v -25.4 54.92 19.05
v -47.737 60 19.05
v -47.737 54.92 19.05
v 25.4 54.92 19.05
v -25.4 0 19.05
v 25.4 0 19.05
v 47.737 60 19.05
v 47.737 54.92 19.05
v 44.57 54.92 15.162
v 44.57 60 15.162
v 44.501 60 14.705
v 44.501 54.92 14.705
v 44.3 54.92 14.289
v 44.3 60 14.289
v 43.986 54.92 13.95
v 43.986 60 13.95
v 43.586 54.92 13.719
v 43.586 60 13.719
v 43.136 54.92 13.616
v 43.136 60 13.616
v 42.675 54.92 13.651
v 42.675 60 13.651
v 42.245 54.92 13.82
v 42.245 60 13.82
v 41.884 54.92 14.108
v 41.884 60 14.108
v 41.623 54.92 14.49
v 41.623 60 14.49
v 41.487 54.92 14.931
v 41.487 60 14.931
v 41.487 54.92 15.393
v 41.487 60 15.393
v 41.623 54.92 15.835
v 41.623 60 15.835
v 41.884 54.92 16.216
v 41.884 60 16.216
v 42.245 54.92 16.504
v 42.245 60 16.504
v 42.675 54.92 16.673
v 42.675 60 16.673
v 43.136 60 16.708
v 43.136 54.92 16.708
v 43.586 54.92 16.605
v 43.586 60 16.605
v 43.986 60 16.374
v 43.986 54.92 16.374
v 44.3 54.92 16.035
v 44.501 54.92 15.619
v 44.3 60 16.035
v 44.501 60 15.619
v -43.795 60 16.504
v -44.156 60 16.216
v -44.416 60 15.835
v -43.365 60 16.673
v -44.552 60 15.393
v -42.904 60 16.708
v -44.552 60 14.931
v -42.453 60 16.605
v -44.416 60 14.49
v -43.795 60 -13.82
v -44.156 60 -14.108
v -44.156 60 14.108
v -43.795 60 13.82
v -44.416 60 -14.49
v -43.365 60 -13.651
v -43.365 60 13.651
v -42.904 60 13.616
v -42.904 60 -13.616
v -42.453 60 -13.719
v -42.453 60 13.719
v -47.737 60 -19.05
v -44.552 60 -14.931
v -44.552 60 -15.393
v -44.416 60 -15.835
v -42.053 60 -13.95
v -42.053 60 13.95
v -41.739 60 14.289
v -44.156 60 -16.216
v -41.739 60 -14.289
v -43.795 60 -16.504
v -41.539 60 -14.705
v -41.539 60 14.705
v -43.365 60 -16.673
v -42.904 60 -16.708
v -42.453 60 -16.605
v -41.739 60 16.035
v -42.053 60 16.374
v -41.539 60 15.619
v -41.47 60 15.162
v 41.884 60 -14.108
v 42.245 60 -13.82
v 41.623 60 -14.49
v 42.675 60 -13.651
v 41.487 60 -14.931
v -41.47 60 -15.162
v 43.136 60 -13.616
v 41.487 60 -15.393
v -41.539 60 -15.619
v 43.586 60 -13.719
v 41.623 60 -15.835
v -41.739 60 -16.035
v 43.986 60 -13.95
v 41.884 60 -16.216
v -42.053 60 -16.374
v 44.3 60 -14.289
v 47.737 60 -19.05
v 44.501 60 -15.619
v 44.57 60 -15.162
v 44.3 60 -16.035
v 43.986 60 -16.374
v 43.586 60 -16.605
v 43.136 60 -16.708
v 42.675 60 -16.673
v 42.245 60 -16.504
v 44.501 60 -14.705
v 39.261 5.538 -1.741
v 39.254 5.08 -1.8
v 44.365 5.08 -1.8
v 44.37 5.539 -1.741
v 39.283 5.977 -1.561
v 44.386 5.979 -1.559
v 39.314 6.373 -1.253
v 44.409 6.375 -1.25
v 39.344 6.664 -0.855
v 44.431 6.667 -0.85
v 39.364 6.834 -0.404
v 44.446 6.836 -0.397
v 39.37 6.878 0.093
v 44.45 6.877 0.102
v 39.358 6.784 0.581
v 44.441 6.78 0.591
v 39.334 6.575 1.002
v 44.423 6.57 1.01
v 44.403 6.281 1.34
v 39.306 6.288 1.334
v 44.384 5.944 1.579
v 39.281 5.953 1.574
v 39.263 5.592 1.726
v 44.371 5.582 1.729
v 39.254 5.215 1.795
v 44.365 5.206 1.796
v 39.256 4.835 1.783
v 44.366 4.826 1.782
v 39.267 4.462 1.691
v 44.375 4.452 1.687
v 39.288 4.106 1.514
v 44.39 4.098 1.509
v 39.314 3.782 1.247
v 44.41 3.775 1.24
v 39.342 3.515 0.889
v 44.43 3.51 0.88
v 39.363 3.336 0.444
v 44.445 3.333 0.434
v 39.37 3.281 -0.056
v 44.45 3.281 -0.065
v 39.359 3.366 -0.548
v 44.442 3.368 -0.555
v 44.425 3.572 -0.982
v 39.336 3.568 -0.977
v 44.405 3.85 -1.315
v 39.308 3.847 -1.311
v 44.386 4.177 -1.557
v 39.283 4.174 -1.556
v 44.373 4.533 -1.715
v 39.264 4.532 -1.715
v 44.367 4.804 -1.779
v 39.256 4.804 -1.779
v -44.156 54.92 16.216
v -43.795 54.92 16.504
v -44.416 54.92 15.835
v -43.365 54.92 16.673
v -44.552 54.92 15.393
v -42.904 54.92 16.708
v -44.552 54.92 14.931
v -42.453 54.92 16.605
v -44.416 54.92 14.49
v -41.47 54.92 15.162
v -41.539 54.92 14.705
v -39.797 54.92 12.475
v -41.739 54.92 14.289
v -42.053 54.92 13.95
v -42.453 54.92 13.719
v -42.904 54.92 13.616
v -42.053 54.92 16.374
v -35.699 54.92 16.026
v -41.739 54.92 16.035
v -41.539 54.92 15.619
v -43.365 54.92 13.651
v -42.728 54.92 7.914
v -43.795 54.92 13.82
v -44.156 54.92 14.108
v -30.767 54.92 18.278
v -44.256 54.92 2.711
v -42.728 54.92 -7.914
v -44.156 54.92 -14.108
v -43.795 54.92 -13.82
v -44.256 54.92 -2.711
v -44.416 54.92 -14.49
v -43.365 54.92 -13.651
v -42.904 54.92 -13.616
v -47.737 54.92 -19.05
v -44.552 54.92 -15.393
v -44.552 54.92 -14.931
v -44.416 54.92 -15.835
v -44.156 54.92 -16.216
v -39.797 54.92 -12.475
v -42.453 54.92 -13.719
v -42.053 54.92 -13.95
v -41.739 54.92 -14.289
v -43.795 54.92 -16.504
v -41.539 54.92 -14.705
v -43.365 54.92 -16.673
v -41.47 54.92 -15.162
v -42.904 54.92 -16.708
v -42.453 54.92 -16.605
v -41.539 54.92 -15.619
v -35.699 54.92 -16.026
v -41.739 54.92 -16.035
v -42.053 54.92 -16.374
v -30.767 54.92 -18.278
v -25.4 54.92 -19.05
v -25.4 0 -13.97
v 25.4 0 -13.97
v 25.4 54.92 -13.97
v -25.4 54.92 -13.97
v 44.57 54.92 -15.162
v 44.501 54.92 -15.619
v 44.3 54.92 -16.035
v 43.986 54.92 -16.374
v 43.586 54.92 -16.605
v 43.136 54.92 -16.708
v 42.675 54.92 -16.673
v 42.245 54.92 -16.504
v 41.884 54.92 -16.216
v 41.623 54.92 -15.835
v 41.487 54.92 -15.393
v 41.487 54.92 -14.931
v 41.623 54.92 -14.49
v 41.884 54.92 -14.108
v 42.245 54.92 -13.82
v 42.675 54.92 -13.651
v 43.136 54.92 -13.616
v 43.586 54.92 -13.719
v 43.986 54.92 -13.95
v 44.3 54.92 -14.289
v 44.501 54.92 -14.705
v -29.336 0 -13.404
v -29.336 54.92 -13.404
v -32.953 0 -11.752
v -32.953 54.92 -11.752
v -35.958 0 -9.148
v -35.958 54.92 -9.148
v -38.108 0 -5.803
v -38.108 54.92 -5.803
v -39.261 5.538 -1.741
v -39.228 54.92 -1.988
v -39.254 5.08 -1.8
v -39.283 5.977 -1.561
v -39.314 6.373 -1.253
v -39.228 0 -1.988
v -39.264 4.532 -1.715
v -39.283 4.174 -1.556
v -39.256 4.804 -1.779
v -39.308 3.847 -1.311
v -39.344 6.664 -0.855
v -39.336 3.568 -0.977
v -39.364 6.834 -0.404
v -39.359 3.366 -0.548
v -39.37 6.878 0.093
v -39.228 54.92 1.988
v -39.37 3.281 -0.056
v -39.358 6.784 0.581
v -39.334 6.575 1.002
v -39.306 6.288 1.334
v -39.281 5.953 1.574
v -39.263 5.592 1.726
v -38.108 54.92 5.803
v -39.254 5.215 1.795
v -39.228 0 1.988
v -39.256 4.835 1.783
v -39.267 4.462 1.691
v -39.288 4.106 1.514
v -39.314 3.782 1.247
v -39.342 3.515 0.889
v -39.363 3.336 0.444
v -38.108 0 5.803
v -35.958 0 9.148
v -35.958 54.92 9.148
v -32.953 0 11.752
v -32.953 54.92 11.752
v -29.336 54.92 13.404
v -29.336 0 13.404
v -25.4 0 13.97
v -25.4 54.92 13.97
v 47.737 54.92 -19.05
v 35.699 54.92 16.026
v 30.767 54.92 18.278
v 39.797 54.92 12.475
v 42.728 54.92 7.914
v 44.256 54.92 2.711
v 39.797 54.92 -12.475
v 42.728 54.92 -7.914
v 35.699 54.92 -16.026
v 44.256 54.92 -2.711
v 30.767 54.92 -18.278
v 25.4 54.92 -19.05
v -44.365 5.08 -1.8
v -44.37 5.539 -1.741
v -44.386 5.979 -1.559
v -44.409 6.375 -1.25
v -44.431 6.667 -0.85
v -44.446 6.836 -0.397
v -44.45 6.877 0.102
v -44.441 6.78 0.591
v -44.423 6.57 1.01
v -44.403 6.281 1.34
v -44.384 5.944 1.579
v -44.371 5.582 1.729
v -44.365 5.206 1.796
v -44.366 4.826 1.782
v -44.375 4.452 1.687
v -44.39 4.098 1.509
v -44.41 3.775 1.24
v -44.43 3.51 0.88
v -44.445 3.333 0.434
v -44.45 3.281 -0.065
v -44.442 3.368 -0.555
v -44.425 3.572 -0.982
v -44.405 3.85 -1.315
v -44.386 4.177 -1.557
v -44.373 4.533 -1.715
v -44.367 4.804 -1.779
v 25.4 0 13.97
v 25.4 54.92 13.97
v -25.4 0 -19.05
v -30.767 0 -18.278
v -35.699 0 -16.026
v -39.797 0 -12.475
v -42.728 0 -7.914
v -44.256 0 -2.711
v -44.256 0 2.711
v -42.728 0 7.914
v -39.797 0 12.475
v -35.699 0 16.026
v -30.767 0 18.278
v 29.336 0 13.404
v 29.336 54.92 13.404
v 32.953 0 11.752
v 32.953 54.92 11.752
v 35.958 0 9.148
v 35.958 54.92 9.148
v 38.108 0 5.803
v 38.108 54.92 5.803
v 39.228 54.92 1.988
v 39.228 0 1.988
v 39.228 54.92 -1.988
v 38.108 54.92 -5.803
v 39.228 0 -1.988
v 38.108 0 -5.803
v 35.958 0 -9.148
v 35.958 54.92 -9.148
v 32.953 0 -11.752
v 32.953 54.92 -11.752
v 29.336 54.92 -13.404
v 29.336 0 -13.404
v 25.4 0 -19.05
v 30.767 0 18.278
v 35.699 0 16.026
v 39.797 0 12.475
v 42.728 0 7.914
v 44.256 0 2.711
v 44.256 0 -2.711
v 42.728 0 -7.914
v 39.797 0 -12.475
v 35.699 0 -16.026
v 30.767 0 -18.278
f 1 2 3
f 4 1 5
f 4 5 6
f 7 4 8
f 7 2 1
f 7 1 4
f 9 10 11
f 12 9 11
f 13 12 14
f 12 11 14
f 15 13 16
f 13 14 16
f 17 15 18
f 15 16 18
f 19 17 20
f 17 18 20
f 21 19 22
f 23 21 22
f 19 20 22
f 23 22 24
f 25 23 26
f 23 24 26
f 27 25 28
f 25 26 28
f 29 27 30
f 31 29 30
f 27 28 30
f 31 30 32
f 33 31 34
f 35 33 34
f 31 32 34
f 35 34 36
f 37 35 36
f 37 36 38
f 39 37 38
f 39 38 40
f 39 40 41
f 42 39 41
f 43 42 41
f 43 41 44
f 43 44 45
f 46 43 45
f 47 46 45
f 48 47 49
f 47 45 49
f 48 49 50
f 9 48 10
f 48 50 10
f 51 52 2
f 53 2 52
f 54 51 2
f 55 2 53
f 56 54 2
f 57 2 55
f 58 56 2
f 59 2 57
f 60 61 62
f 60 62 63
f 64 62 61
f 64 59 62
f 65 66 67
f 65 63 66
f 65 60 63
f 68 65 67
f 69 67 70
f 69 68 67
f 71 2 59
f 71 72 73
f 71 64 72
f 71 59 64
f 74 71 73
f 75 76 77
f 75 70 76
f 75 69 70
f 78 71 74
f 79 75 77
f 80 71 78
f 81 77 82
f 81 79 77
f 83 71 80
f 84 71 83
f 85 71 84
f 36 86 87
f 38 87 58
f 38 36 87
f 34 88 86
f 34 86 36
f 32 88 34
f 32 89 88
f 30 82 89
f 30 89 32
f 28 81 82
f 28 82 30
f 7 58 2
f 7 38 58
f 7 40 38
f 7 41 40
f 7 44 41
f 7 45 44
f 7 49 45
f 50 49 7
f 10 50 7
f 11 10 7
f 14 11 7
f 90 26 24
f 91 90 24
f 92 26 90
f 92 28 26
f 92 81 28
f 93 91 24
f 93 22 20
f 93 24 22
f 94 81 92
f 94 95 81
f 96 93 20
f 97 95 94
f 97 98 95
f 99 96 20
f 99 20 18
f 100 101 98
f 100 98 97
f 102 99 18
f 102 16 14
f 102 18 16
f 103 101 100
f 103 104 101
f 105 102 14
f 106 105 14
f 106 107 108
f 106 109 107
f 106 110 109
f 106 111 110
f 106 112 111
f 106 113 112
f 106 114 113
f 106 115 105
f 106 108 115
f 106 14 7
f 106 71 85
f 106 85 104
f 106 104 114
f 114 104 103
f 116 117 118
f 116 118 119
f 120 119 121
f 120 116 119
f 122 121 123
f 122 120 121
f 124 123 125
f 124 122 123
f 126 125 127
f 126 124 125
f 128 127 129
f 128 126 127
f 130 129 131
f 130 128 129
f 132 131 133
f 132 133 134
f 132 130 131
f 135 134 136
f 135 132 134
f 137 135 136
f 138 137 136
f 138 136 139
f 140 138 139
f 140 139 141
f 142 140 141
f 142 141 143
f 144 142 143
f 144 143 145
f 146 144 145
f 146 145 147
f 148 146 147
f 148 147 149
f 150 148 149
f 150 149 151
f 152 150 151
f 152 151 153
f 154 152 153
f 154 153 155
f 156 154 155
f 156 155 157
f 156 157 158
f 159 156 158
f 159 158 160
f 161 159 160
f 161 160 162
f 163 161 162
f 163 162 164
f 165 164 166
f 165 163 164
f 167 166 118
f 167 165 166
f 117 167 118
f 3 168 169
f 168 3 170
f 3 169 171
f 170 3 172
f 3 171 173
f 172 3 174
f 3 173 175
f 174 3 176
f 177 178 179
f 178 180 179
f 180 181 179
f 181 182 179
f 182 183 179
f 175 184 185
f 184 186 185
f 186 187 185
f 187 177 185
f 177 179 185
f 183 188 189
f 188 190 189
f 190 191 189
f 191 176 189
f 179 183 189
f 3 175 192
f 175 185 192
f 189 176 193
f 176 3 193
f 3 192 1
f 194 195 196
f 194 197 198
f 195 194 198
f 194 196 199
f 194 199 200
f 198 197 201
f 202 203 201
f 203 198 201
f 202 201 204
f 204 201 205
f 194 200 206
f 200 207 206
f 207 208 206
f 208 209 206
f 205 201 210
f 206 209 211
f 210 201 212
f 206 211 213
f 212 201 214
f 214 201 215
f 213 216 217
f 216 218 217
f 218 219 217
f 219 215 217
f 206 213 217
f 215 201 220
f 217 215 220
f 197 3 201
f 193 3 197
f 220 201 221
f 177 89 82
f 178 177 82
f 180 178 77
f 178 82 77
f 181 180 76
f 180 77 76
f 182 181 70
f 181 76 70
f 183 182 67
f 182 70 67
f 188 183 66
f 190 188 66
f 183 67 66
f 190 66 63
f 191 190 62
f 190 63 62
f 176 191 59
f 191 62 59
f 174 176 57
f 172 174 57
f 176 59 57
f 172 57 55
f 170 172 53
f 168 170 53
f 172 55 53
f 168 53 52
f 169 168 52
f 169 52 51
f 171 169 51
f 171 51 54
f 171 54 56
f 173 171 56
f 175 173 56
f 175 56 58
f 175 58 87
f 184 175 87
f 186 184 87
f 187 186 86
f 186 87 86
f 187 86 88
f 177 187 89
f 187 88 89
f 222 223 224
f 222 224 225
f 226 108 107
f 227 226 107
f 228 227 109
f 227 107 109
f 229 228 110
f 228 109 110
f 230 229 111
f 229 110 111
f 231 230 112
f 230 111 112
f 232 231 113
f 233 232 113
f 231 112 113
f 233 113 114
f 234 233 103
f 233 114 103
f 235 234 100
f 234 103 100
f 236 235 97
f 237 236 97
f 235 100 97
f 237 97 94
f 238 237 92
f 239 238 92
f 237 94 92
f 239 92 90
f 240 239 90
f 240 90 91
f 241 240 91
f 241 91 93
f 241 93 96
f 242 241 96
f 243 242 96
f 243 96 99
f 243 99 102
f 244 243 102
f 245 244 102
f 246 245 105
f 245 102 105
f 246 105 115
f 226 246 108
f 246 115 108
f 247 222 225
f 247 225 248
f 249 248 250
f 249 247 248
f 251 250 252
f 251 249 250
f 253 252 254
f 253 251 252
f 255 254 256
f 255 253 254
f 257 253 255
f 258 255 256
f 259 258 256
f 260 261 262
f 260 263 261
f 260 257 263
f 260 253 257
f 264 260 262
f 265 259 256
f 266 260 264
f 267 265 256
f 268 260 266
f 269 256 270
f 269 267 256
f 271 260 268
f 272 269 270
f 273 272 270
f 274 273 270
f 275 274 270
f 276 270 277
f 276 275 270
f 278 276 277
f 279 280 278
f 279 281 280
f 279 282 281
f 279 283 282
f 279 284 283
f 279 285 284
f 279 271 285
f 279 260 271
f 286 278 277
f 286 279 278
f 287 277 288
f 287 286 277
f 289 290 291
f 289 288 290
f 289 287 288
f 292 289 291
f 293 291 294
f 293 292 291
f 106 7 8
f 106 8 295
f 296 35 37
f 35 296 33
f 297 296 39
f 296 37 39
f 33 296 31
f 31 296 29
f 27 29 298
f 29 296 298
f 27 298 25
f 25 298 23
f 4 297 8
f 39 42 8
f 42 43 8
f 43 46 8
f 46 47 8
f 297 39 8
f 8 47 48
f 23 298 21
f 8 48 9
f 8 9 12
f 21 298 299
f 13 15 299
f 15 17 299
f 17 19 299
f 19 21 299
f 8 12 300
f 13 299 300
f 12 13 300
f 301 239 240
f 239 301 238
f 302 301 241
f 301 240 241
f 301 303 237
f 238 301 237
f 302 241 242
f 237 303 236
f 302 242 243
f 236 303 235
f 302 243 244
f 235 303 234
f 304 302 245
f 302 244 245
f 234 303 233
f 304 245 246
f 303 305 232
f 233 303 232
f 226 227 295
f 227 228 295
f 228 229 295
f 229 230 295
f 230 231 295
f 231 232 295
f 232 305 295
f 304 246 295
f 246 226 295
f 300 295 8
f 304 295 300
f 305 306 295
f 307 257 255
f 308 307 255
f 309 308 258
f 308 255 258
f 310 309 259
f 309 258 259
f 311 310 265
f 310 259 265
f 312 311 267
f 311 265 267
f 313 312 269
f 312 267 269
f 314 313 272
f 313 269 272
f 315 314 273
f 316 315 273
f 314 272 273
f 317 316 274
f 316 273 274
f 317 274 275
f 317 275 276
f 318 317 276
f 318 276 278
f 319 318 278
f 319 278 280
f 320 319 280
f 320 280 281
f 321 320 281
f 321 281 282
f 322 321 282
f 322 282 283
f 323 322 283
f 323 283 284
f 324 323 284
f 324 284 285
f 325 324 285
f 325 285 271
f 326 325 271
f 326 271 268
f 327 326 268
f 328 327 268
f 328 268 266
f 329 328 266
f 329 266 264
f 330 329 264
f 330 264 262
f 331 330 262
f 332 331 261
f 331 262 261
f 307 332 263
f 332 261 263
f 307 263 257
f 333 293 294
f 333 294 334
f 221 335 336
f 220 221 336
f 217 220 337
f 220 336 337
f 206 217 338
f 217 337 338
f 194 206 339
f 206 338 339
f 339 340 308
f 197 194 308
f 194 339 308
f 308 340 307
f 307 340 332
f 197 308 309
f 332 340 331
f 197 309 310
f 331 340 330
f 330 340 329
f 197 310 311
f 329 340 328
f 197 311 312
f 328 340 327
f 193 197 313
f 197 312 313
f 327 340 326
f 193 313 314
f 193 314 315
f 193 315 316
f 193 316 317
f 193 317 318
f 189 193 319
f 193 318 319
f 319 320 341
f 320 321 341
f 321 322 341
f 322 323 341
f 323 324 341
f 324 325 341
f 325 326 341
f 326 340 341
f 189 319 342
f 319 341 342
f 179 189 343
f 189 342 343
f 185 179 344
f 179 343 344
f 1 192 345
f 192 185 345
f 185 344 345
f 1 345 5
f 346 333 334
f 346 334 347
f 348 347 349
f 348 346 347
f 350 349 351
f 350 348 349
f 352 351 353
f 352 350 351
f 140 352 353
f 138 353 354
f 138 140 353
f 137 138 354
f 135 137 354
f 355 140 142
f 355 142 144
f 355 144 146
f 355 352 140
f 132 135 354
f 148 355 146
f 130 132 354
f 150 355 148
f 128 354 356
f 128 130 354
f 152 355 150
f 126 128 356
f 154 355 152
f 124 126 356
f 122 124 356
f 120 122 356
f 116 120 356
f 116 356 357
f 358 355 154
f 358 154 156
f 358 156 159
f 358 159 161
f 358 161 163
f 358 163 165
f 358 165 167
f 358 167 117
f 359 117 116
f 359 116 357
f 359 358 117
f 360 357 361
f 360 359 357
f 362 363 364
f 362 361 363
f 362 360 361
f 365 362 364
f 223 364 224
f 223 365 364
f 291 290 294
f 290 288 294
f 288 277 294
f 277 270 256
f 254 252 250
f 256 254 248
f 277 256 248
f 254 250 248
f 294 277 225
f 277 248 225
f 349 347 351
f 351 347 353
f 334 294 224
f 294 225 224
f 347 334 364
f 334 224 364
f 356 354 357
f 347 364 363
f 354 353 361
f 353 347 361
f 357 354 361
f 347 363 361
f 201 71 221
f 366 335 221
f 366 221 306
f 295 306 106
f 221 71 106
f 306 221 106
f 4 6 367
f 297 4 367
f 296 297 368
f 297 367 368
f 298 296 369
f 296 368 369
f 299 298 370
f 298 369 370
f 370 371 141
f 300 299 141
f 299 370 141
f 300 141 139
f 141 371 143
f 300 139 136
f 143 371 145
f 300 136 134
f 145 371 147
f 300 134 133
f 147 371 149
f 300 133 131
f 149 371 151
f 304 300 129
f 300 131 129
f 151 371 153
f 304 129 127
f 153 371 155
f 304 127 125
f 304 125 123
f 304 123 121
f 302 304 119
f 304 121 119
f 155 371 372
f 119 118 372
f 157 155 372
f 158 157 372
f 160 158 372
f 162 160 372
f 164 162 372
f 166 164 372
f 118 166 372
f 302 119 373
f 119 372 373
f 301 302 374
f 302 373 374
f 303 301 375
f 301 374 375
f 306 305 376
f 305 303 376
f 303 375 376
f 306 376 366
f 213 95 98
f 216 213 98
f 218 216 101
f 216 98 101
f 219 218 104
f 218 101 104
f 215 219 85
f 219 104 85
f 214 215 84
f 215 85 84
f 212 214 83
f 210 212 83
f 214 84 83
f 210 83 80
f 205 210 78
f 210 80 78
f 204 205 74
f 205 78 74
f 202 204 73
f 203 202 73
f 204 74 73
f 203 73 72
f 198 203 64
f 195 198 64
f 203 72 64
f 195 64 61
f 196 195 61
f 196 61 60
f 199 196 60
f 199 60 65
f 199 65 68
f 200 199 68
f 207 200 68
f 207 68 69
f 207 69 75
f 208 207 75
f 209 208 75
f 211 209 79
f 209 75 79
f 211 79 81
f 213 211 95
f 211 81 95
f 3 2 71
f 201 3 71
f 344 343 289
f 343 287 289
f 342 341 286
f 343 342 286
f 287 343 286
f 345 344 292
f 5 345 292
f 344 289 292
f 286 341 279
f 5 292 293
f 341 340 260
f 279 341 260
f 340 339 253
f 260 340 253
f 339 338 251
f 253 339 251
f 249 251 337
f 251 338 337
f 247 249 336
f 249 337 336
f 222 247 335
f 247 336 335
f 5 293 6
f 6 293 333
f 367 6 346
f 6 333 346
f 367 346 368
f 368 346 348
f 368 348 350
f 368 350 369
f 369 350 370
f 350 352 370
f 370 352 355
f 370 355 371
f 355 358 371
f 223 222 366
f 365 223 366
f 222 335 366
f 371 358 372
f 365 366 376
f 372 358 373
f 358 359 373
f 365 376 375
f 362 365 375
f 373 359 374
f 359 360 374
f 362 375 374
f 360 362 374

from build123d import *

# Parameters (mm, degrees)
BOSS_EXTRUDE1_DEPTH     = 60
SKETCH2_W               = 95.474406292
SKETCH2_H               = 38.1
SKETCH2_R               = 1.55
BOSS_EXTRUDE2_DEPTH     = 5.08
SKETCH4_R               = 1.8
CUT_EXTRUDE1_DEPTH      = 96.52
CUT_EXTRUDE1_DEPTH_BACK = 107.696


with BuildPart() as part:
    # Sketch1 → Boss-Extrude1 (new body)
    with BuildSketch(Plane(origin=(0, 0, 0), x_dir=(1, 0, 0), z_dir=(0, 1, 0))):
        with BuildLine():
            Line((-25.4, -19.05), (25.4, -19.05))
            ThreePointArc((25.4, -19.05), (44.45, 0), (25.4, 19.05))
            Line((25.4, 19.05), (-25.4, 19.05))
            ThreePointArc((-25.4, 19.05), (-44.45, 0), (-25.4, -19.05))
        make_face()
        with BuildLine():
            Line((-25.4, -13.97), (25.4, -13.97))
            ThreePointArc((25.4, -13.97), (39.37, 0), (25.4, 13.97))
            Line((25.4, 13.97), (-25.4, 13.97))
            ThreePointArc((-25.4, 13.97), (-39.37, 0), (-25.4, -13.97))
        make_face(mode=Mode.SUBTRACT)
    extrude(amount=BOSS_EXTRUDE1_DEPTH)

    # Sketch2 → Boss-Extrude2 (add)
    with BuildSketch(Plane(origin=(0, 60, 0), x_dir=(1, 0, 0), z_dir=(0, 1, 0))):
        Rectangle(SKETCH2_W, SKETCH2_H)
        with Locations((43.019742204, 15.162081353)):
            Circle(SKETCH2_R, mode=Mode.SUBTRACT)
        with Locations((43.019742204, -15.162081353)):
            Circle(SKETCH2_R, mode=Mode.SUBTRACT)
        with Locations((-43.019742204, -15.162081353)):
            Circle(SKETCH2_R, mode=Mode.SUBTRACT)
        with Locations((-43.019742204, 15.162081353)):
            Circle(SKETCH2_R, mode=Mode.SUBTRACT)
    extrude(amount=-BOSS_EXTRUDE2_DEPTH)

    # Sketch4 → Cut-Extrude1 (cut, two sides)
    with BuildSketch(Plane(origin=(0, 0, 0), x_dir=(0, 0, -1), z_dir=(1, 0, 0))) as cut_extrude1_sk:
        with Locations((0, 5.08)):
            Circle(SKETCH4_R)
    extrude(amount=CUT_EXTRUDE1_DEPTH, mode=Mode.SUBTRACT)
    extrude(cut_extrude1_sk.sketch, amount=-CUT_EXTRUDE1_DEPTH_BACK, mode=Mode.SUBTRACT)


solid = part.part
